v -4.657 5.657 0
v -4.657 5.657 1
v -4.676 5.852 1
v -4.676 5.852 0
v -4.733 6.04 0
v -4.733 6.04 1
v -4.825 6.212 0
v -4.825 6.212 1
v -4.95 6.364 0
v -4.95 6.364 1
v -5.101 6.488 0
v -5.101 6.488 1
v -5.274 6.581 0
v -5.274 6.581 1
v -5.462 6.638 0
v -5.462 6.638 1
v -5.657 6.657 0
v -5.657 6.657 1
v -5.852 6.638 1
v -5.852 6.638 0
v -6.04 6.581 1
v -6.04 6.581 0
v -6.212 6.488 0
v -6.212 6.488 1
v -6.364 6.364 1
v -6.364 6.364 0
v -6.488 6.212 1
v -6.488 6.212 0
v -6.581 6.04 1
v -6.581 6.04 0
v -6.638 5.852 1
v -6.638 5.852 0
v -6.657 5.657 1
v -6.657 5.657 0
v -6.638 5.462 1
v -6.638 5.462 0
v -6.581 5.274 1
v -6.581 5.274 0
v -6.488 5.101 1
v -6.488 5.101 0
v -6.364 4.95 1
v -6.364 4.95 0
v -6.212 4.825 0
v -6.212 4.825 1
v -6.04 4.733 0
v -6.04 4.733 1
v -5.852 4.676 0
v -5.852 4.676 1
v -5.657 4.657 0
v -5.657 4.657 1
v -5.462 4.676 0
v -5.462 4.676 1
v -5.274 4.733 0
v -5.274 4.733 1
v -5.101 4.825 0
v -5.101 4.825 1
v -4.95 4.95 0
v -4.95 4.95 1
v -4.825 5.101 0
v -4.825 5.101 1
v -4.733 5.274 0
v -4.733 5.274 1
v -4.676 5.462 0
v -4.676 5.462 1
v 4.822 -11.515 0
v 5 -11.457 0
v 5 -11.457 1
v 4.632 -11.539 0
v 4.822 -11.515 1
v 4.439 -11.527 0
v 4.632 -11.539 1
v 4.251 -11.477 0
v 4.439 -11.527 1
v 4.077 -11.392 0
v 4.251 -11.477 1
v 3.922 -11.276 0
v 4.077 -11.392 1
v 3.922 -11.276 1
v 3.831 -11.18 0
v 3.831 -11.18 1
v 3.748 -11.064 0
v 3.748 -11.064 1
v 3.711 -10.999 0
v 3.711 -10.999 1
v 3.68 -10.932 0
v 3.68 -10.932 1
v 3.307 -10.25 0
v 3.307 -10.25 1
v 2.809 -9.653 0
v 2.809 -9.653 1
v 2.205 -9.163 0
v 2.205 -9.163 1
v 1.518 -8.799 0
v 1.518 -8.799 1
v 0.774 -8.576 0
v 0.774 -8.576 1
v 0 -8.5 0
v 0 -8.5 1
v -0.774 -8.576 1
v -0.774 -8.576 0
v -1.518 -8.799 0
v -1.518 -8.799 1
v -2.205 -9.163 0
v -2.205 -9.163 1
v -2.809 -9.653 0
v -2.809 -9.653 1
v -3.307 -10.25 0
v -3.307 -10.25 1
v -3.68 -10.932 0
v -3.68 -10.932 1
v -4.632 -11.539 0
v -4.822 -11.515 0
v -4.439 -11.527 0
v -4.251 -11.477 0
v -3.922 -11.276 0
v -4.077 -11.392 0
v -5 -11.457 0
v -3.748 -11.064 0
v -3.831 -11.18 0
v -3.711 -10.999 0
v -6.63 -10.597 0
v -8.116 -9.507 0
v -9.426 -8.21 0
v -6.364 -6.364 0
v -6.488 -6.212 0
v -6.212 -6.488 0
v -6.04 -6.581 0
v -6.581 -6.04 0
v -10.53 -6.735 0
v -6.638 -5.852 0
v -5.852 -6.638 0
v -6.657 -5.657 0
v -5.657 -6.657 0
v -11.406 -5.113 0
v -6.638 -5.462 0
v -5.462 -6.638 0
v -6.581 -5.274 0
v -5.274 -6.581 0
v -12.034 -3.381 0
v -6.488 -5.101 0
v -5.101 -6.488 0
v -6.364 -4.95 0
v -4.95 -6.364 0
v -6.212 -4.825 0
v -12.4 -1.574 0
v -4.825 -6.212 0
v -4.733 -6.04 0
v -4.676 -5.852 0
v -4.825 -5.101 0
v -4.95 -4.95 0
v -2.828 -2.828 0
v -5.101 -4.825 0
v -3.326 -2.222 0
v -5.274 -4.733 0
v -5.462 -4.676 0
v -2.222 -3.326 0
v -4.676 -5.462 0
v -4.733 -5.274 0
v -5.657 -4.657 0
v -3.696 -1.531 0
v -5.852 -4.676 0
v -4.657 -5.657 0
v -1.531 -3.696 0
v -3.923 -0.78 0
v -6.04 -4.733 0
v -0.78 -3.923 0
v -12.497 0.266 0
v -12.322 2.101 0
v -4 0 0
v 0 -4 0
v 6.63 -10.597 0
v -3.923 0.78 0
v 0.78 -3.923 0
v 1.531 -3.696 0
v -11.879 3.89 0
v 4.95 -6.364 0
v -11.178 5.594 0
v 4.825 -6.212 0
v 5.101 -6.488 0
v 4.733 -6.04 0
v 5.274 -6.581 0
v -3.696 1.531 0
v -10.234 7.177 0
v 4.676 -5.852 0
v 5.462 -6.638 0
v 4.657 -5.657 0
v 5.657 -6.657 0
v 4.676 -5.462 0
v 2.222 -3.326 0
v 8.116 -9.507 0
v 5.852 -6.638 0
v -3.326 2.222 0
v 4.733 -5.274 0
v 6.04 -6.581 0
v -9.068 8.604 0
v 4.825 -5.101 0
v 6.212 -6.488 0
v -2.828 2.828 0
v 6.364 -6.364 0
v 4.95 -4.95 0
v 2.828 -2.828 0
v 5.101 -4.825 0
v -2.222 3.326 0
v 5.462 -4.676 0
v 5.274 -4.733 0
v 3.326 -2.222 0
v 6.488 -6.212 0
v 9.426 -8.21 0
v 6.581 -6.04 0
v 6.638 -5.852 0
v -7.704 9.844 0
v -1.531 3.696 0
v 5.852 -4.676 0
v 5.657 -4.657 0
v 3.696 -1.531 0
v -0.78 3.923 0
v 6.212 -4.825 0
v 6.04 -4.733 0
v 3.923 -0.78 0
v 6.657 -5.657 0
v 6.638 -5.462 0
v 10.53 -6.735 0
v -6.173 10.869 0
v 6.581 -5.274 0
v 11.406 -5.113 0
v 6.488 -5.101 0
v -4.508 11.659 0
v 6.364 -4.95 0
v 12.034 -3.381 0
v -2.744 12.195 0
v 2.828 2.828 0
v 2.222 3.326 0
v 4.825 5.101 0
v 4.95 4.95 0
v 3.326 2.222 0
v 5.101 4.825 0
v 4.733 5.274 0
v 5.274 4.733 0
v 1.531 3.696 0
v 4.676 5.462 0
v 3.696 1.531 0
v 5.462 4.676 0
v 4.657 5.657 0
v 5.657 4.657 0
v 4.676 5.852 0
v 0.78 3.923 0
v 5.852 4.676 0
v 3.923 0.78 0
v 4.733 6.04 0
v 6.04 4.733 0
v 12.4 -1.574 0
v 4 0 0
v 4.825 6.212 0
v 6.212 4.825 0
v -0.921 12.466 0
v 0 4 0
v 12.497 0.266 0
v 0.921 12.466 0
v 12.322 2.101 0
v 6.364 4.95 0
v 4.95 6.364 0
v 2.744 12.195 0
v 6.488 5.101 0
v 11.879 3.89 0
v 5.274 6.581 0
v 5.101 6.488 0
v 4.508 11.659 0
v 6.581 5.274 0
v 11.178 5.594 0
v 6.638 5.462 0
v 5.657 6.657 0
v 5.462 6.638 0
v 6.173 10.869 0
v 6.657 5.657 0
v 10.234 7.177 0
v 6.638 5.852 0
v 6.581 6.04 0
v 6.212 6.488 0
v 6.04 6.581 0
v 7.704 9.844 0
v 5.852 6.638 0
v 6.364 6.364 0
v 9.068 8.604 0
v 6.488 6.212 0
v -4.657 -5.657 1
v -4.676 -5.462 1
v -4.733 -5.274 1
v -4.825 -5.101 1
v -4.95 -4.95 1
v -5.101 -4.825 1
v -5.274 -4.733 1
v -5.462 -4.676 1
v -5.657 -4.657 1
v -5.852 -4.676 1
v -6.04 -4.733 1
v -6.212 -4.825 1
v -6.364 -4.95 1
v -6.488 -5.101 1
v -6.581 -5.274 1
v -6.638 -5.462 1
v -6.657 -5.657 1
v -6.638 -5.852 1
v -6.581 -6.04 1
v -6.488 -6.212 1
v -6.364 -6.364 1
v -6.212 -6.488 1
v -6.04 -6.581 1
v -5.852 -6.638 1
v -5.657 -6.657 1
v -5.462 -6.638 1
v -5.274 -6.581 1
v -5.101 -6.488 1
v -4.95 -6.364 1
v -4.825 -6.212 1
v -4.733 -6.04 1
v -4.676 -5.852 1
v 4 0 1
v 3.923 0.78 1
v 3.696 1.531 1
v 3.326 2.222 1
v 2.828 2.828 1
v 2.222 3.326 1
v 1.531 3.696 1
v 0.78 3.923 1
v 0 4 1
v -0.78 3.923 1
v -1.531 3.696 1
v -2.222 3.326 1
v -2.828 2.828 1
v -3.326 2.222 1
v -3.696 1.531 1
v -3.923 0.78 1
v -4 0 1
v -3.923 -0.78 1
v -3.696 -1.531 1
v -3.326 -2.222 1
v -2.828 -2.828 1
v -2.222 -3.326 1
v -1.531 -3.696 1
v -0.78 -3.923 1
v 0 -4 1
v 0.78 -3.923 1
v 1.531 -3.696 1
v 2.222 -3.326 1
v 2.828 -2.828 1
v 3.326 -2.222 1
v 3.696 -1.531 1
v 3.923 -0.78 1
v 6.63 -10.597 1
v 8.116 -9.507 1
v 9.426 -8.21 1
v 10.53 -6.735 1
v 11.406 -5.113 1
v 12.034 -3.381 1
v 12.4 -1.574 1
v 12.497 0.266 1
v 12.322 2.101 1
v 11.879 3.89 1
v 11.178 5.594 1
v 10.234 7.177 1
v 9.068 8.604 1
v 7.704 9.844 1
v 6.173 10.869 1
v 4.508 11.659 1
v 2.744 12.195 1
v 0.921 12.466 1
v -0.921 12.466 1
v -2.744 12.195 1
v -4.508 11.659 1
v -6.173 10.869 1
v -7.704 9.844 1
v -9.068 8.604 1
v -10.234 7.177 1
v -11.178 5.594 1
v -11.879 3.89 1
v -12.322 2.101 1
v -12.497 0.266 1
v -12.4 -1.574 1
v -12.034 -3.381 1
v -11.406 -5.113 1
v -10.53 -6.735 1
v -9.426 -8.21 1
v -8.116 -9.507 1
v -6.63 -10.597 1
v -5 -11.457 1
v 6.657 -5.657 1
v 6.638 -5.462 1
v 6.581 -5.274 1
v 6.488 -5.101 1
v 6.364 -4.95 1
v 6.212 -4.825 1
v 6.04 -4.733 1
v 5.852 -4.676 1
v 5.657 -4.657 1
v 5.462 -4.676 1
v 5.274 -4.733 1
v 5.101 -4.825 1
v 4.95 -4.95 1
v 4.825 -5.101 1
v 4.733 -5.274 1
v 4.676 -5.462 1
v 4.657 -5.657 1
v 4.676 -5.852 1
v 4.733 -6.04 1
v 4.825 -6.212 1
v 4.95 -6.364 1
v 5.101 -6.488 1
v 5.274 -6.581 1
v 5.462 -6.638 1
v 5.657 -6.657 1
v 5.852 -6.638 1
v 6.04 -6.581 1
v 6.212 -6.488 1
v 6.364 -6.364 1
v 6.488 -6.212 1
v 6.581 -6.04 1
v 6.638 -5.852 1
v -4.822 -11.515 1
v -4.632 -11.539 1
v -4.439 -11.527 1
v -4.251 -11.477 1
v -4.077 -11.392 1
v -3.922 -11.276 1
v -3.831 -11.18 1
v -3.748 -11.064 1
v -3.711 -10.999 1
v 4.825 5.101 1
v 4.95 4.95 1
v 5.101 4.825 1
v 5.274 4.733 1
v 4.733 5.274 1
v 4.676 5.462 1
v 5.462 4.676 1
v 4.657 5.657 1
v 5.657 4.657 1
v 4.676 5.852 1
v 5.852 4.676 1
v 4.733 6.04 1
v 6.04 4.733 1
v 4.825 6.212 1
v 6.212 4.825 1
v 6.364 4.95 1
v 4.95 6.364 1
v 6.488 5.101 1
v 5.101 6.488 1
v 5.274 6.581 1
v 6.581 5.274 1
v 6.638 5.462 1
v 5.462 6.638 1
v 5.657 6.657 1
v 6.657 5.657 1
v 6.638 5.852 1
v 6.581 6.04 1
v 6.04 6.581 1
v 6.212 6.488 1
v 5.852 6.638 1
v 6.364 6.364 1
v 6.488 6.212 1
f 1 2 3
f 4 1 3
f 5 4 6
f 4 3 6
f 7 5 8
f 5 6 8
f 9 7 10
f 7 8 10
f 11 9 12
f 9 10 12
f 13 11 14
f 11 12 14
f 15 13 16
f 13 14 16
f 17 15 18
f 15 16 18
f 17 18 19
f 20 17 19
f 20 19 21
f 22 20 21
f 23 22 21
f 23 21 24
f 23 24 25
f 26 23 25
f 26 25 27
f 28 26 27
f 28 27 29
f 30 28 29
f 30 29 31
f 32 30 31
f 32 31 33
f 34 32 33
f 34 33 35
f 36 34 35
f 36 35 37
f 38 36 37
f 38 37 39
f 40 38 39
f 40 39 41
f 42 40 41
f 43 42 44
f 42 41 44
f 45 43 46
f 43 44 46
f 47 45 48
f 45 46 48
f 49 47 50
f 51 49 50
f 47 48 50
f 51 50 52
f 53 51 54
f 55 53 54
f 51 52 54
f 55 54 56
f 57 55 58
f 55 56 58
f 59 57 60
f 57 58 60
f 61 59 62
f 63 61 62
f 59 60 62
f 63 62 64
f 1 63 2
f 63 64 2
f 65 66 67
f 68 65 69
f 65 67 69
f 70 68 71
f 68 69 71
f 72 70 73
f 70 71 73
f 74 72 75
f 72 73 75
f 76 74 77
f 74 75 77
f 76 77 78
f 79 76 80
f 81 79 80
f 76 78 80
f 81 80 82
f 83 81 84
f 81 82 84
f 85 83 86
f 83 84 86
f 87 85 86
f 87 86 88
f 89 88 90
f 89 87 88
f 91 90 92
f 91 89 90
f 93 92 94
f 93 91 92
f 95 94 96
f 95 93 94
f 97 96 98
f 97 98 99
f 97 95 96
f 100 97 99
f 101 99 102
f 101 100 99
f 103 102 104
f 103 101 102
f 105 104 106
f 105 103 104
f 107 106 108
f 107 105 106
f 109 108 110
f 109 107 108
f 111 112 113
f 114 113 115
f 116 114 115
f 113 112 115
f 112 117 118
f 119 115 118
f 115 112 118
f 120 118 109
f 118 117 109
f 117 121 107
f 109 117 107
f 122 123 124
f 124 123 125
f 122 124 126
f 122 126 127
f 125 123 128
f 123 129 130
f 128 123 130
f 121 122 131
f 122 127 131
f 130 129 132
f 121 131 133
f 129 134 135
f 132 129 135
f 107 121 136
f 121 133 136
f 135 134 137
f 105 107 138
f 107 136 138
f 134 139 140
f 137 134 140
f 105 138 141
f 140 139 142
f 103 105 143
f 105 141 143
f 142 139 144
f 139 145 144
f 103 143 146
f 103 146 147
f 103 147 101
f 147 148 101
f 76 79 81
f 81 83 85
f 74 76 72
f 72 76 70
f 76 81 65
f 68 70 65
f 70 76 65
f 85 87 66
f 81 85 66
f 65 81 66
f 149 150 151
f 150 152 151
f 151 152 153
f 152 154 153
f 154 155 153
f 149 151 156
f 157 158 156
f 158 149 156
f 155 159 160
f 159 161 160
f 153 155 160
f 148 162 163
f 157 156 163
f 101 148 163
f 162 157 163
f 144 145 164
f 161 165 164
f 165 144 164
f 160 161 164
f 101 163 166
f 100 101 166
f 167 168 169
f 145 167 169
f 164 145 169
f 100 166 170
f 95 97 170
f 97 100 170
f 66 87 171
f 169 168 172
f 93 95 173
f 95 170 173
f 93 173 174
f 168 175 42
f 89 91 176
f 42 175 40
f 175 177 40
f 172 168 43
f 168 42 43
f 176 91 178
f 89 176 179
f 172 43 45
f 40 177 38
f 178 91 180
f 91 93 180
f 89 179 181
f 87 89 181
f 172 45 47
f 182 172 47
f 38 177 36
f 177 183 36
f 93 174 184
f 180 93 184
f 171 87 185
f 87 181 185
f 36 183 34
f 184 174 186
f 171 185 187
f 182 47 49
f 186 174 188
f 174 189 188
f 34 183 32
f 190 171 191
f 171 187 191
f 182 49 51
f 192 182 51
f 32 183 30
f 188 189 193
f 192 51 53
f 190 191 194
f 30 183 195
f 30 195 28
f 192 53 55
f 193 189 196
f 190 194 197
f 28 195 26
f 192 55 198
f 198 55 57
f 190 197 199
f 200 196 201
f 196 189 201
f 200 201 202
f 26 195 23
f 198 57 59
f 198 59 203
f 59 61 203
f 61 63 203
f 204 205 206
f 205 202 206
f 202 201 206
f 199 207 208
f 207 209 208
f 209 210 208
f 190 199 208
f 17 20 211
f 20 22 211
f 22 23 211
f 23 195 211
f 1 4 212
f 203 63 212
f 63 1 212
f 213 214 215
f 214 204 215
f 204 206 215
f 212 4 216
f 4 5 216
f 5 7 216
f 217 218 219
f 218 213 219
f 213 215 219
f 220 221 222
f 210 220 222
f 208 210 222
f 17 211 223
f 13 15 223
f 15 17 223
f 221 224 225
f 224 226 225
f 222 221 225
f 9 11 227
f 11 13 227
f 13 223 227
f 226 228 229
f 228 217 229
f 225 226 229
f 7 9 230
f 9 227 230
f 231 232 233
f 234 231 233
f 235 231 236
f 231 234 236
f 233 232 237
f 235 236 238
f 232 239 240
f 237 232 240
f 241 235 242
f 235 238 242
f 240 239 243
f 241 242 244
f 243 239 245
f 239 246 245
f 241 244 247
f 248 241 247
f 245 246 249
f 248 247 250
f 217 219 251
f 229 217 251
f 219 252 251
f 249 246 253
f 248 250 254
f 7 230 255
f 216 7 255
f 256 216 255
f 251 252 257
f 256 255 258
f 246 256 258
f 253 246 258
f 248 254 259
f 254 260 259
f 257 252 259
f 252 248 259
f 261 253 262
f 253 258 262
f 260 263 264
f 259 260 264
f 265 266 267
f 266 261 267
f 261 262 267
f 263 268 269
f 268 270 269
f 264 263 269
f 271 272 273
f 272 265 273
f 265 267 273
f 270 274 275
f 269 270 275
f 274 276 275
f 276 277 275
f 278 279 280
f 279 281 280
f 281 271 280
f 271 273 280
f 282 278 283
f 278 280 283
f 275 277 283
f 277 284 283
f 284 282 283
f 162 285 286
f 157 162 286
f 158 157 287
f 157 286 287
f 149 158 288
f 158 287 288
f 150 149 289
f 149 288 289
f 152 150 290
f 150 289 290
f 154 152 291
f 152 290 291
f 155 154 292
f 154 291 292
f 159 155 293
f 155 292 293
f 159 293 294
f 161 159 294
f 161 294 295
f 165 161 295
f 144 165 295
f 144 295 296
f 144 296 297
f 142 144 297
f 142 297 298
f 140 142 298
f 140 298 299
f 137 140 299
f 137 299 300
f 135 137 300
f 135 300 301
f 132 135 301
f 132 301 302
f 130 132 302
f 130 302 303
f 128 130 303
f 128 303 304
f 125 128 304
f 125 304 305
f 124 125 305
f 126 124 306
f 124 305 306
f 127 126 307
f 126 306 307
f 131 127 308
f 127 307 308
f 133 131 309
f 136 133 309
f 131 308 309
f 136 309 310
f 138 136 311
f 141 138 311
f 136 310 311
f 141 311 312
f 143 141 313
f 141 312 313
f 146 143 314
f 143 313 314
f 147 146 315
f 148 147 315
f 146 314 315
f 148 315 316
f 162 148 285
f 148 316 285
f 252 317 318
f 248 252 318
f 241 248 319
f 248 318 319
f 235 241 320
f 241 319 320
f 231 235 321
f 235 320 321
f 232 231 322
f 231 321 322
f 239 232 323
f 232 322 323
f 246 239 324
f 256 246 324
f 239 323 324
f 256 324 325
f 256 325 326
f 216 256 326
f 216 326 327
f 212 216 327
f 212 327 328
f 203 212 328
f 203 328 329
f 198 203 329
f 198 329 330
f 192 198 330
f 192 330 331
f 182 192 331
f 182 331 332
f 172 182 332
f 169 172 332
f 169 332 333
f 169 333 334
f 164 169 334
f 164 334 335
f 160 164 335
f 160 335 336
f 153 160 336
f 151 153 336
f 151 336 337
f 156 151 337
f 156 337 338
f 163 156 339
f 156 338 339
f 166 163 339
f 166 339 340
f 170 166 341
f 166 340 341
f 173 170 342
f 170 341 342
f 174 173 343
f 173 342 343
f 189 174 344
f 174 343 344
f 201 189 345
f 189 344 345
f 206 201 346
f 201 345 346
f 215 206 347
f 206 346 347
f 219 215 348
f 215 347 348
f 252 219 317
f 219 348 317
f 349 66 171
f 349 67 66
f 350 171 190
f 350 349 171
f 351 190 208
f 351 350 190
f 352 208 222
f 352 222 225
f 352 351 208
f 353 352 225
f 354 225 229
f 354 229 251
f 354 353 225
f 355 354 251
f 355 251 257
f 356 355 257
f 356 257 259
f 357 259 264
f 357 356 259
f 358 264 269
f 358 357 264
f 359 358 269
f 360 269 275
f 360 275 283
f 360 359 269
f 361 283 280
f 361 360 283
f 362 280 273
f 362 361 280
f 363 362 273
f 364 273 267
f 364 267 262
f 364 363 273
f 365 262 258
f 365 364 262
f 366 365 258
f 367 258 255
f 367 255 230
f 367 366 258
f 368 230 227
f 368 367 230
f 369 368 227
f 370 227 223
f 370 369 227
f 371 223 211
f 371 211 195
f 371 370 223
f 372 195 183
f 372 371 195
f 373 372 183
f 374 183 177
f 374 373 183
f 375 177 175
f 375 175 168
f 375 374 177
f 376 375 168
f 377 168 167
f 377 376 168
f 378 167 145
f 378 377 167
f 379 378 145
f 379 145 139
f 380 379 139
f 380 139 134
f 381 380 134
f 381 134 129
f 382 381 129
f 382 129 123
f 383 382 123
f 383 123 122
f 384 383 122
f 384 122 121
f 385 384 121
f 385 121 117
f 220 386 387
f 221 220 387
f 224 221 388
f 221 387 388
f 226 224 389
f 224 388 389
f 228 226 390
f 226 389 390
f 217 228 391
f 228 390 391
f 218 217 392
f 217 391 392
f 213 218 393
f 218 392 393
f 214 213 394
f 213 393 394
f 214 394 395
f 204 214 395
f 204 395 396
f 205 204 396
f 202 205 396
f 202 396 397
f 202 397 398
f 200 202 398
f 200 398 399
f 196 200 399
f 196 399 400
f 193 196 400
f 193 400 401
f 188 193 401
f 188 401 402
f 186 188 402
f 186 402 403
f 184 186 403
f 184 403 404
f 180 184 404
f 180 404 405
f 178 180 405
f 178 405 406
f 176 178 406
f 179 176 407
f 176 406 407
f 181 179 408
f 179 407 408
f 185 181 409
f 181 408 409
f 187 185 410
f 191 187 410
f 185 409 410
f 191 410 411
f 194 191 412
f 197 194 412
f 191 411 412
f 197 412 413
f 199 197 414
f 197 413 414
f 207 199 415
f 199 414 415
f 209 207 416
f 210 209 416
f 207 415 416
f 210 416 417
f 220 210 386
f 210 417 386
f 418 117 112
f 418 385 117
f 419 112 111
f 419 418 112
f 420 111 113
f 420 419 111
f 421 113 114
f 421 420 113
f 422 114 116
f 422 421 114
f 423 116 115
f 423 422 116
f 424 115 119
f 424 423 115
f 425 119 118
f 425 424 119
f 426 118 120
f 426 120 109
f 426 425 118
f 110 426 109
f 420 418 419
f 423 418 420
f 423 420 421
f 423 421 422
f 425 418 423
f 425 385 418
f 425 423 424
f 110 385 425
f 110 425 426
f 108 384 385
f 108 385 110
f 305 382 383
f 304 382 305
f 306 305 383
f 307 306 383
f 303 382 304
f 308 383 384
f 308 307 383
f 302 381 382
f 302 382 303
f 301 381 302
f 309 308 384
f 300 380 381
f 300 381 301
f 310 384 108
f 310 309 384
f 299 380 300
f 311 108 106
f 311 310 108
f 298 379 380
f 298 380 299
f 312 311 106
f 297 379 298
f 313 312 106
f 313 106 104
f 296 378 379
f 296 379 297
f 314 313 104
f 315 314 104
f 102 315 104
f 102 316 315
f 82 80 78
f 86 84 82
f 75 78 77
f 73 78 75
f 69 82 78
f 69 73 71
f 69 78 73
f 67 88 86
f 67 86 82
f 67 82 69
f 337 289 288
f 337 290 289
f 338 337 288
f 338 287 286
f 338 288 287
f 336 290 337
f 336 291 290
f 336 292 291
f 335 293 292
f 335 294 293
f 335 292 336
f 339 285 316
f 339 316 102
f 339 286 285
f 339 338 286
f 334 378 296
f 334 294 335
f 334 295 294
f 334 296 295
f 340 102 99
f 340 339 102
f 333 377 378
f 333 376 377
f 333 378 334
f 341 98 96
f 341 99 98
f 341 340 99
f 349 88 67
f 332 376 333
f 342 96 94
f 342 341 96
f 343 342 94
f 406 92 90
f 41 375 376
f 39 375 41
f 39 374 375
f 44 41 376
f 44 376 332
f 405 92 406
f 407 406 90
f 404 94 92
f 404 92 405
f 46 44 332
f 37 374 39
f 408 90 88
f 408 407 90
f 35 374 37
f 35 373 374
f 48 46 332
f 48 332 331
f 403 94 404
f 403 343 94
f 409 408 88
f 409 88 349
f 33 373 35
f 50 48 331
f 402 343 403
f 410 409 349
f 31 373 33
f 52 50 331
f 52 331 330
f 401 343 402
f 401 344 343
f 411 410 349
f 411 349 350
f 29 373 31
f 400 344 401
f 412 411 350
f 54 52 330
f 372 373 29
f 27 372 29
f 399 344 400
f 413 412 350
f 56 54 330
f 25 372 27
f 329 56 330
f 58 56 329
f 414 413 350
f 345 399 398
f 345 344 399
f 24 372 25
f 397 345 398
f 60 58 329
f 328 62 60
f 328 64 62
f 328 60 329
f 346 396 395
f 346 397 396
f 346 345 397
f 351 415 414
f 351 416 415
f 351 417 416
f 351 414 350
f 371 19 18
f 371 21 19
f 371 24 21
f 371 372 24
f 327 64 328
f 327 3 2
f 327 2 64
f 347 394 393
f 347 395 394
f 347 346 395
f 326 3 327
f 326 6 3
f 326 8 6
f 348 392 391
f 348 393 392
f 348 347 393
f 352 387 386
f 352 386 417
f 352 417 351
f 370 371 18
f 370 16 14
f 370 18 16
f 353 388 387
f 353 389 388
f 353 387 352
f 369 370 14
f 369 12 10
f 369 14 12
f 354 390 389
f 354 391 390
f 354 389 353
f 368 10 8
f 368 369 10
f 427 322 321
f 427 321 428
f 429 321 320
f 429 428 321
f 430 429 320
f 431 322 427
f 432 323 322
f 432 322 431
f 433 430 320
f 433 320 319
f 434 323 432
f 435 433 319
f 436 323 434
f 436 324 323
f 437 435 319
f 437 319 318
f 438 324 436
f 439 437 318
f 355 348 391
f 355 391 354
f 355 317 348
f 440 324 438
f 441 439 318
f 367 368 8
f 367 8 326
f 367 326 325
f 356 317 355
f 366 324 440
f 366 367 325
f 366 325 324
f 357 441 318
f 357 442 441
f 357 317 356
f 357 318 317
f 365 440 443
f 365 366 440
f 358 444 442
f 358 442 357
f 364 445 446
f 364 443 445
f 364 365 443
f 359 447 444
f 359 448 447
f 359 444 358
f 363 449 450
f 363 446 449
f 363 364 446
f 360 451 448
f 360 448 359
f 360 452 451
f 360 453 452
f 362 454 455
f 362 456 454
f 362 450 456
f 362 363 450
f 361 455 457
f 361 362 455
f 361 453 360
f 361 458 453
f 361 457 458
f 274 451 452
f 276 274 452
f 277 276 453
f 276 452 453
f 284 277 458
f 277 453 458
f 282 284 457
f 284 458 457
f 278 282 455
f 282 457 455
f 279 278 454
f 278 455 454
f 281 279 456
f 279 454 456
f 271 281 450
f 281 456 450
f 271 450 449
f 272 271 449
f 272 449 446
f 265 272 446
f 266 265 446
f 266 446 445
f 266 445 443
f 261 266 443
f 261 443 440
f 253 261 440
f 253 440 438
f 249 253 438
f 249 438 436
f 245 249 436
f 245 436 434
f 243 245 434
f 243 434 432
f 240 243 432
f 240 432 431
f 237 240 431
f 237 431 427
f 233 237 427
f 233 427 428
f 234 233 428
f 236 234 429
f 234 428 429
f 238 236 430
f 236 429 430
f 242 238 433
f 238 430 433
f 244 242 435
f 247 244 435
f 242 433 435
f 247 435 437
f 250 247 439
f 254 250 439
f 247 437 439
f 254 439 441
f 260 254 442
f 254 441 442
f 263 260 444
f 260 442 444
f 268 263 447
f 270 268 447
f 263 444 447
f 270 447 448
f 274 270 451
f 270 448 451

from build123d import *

# Parameters (mm, degrees)
F0_R     = 12.5
F0_R_2   = 1
F0_R_3   = 4
F2_R     = 4
F4_DEPTH = 1
F5_R     = 1


with BuildPart() as f3:
    # F3: sweep along a path in F1
    with BuildLine(Plane.XZ) as f3_path:
        Line((0, 0), (0, 1))
    # F0 (on Top) → F3 (sweep)
    with BuildSketch(Plane.XY):
        Circle(F0_R)
        with Locations((-5.6568542495, -5.6568542495)):
            Circle(F0_R_2, mode=Mode.SUBTRACT)
        with Locations((5.6568542495, -5.6568542495)):
            Circle(F0_R_2, mode=Mode.SUBTRACT)
        with Locations((-5.6568542495, 5.6568542495)):
            Circle(F0_R_2, mode=Mode.SUBTRACT)
        Circle(F0_R_3, mode=Mode.SUBTRACT)
        with Locations((5.6568542495, 5.6568542495)):
            Circle(F0_R_2, mode=Mode.SUBTRACT)
    sweep(path=f3_path.line)

    # F2 (on Top) → F4 (cut, through all)
    with BuildSketch(Plane.XY):
        with Locations((0, -12.5)):
            Circle(F2_R)
    extrude(amount=F4_DEPTH, mode=Mode.SUBTRACT)

    # F5
    f5_edges = [f3.edges().sort_by_distance(p)[0] for p in [
        (-3.948468, -11.86, 0.5),
        (3.948468, -11.86, 0.5),
    ]]
    fillet(f5_edges, radius=F5_R)


solid = f3.part
